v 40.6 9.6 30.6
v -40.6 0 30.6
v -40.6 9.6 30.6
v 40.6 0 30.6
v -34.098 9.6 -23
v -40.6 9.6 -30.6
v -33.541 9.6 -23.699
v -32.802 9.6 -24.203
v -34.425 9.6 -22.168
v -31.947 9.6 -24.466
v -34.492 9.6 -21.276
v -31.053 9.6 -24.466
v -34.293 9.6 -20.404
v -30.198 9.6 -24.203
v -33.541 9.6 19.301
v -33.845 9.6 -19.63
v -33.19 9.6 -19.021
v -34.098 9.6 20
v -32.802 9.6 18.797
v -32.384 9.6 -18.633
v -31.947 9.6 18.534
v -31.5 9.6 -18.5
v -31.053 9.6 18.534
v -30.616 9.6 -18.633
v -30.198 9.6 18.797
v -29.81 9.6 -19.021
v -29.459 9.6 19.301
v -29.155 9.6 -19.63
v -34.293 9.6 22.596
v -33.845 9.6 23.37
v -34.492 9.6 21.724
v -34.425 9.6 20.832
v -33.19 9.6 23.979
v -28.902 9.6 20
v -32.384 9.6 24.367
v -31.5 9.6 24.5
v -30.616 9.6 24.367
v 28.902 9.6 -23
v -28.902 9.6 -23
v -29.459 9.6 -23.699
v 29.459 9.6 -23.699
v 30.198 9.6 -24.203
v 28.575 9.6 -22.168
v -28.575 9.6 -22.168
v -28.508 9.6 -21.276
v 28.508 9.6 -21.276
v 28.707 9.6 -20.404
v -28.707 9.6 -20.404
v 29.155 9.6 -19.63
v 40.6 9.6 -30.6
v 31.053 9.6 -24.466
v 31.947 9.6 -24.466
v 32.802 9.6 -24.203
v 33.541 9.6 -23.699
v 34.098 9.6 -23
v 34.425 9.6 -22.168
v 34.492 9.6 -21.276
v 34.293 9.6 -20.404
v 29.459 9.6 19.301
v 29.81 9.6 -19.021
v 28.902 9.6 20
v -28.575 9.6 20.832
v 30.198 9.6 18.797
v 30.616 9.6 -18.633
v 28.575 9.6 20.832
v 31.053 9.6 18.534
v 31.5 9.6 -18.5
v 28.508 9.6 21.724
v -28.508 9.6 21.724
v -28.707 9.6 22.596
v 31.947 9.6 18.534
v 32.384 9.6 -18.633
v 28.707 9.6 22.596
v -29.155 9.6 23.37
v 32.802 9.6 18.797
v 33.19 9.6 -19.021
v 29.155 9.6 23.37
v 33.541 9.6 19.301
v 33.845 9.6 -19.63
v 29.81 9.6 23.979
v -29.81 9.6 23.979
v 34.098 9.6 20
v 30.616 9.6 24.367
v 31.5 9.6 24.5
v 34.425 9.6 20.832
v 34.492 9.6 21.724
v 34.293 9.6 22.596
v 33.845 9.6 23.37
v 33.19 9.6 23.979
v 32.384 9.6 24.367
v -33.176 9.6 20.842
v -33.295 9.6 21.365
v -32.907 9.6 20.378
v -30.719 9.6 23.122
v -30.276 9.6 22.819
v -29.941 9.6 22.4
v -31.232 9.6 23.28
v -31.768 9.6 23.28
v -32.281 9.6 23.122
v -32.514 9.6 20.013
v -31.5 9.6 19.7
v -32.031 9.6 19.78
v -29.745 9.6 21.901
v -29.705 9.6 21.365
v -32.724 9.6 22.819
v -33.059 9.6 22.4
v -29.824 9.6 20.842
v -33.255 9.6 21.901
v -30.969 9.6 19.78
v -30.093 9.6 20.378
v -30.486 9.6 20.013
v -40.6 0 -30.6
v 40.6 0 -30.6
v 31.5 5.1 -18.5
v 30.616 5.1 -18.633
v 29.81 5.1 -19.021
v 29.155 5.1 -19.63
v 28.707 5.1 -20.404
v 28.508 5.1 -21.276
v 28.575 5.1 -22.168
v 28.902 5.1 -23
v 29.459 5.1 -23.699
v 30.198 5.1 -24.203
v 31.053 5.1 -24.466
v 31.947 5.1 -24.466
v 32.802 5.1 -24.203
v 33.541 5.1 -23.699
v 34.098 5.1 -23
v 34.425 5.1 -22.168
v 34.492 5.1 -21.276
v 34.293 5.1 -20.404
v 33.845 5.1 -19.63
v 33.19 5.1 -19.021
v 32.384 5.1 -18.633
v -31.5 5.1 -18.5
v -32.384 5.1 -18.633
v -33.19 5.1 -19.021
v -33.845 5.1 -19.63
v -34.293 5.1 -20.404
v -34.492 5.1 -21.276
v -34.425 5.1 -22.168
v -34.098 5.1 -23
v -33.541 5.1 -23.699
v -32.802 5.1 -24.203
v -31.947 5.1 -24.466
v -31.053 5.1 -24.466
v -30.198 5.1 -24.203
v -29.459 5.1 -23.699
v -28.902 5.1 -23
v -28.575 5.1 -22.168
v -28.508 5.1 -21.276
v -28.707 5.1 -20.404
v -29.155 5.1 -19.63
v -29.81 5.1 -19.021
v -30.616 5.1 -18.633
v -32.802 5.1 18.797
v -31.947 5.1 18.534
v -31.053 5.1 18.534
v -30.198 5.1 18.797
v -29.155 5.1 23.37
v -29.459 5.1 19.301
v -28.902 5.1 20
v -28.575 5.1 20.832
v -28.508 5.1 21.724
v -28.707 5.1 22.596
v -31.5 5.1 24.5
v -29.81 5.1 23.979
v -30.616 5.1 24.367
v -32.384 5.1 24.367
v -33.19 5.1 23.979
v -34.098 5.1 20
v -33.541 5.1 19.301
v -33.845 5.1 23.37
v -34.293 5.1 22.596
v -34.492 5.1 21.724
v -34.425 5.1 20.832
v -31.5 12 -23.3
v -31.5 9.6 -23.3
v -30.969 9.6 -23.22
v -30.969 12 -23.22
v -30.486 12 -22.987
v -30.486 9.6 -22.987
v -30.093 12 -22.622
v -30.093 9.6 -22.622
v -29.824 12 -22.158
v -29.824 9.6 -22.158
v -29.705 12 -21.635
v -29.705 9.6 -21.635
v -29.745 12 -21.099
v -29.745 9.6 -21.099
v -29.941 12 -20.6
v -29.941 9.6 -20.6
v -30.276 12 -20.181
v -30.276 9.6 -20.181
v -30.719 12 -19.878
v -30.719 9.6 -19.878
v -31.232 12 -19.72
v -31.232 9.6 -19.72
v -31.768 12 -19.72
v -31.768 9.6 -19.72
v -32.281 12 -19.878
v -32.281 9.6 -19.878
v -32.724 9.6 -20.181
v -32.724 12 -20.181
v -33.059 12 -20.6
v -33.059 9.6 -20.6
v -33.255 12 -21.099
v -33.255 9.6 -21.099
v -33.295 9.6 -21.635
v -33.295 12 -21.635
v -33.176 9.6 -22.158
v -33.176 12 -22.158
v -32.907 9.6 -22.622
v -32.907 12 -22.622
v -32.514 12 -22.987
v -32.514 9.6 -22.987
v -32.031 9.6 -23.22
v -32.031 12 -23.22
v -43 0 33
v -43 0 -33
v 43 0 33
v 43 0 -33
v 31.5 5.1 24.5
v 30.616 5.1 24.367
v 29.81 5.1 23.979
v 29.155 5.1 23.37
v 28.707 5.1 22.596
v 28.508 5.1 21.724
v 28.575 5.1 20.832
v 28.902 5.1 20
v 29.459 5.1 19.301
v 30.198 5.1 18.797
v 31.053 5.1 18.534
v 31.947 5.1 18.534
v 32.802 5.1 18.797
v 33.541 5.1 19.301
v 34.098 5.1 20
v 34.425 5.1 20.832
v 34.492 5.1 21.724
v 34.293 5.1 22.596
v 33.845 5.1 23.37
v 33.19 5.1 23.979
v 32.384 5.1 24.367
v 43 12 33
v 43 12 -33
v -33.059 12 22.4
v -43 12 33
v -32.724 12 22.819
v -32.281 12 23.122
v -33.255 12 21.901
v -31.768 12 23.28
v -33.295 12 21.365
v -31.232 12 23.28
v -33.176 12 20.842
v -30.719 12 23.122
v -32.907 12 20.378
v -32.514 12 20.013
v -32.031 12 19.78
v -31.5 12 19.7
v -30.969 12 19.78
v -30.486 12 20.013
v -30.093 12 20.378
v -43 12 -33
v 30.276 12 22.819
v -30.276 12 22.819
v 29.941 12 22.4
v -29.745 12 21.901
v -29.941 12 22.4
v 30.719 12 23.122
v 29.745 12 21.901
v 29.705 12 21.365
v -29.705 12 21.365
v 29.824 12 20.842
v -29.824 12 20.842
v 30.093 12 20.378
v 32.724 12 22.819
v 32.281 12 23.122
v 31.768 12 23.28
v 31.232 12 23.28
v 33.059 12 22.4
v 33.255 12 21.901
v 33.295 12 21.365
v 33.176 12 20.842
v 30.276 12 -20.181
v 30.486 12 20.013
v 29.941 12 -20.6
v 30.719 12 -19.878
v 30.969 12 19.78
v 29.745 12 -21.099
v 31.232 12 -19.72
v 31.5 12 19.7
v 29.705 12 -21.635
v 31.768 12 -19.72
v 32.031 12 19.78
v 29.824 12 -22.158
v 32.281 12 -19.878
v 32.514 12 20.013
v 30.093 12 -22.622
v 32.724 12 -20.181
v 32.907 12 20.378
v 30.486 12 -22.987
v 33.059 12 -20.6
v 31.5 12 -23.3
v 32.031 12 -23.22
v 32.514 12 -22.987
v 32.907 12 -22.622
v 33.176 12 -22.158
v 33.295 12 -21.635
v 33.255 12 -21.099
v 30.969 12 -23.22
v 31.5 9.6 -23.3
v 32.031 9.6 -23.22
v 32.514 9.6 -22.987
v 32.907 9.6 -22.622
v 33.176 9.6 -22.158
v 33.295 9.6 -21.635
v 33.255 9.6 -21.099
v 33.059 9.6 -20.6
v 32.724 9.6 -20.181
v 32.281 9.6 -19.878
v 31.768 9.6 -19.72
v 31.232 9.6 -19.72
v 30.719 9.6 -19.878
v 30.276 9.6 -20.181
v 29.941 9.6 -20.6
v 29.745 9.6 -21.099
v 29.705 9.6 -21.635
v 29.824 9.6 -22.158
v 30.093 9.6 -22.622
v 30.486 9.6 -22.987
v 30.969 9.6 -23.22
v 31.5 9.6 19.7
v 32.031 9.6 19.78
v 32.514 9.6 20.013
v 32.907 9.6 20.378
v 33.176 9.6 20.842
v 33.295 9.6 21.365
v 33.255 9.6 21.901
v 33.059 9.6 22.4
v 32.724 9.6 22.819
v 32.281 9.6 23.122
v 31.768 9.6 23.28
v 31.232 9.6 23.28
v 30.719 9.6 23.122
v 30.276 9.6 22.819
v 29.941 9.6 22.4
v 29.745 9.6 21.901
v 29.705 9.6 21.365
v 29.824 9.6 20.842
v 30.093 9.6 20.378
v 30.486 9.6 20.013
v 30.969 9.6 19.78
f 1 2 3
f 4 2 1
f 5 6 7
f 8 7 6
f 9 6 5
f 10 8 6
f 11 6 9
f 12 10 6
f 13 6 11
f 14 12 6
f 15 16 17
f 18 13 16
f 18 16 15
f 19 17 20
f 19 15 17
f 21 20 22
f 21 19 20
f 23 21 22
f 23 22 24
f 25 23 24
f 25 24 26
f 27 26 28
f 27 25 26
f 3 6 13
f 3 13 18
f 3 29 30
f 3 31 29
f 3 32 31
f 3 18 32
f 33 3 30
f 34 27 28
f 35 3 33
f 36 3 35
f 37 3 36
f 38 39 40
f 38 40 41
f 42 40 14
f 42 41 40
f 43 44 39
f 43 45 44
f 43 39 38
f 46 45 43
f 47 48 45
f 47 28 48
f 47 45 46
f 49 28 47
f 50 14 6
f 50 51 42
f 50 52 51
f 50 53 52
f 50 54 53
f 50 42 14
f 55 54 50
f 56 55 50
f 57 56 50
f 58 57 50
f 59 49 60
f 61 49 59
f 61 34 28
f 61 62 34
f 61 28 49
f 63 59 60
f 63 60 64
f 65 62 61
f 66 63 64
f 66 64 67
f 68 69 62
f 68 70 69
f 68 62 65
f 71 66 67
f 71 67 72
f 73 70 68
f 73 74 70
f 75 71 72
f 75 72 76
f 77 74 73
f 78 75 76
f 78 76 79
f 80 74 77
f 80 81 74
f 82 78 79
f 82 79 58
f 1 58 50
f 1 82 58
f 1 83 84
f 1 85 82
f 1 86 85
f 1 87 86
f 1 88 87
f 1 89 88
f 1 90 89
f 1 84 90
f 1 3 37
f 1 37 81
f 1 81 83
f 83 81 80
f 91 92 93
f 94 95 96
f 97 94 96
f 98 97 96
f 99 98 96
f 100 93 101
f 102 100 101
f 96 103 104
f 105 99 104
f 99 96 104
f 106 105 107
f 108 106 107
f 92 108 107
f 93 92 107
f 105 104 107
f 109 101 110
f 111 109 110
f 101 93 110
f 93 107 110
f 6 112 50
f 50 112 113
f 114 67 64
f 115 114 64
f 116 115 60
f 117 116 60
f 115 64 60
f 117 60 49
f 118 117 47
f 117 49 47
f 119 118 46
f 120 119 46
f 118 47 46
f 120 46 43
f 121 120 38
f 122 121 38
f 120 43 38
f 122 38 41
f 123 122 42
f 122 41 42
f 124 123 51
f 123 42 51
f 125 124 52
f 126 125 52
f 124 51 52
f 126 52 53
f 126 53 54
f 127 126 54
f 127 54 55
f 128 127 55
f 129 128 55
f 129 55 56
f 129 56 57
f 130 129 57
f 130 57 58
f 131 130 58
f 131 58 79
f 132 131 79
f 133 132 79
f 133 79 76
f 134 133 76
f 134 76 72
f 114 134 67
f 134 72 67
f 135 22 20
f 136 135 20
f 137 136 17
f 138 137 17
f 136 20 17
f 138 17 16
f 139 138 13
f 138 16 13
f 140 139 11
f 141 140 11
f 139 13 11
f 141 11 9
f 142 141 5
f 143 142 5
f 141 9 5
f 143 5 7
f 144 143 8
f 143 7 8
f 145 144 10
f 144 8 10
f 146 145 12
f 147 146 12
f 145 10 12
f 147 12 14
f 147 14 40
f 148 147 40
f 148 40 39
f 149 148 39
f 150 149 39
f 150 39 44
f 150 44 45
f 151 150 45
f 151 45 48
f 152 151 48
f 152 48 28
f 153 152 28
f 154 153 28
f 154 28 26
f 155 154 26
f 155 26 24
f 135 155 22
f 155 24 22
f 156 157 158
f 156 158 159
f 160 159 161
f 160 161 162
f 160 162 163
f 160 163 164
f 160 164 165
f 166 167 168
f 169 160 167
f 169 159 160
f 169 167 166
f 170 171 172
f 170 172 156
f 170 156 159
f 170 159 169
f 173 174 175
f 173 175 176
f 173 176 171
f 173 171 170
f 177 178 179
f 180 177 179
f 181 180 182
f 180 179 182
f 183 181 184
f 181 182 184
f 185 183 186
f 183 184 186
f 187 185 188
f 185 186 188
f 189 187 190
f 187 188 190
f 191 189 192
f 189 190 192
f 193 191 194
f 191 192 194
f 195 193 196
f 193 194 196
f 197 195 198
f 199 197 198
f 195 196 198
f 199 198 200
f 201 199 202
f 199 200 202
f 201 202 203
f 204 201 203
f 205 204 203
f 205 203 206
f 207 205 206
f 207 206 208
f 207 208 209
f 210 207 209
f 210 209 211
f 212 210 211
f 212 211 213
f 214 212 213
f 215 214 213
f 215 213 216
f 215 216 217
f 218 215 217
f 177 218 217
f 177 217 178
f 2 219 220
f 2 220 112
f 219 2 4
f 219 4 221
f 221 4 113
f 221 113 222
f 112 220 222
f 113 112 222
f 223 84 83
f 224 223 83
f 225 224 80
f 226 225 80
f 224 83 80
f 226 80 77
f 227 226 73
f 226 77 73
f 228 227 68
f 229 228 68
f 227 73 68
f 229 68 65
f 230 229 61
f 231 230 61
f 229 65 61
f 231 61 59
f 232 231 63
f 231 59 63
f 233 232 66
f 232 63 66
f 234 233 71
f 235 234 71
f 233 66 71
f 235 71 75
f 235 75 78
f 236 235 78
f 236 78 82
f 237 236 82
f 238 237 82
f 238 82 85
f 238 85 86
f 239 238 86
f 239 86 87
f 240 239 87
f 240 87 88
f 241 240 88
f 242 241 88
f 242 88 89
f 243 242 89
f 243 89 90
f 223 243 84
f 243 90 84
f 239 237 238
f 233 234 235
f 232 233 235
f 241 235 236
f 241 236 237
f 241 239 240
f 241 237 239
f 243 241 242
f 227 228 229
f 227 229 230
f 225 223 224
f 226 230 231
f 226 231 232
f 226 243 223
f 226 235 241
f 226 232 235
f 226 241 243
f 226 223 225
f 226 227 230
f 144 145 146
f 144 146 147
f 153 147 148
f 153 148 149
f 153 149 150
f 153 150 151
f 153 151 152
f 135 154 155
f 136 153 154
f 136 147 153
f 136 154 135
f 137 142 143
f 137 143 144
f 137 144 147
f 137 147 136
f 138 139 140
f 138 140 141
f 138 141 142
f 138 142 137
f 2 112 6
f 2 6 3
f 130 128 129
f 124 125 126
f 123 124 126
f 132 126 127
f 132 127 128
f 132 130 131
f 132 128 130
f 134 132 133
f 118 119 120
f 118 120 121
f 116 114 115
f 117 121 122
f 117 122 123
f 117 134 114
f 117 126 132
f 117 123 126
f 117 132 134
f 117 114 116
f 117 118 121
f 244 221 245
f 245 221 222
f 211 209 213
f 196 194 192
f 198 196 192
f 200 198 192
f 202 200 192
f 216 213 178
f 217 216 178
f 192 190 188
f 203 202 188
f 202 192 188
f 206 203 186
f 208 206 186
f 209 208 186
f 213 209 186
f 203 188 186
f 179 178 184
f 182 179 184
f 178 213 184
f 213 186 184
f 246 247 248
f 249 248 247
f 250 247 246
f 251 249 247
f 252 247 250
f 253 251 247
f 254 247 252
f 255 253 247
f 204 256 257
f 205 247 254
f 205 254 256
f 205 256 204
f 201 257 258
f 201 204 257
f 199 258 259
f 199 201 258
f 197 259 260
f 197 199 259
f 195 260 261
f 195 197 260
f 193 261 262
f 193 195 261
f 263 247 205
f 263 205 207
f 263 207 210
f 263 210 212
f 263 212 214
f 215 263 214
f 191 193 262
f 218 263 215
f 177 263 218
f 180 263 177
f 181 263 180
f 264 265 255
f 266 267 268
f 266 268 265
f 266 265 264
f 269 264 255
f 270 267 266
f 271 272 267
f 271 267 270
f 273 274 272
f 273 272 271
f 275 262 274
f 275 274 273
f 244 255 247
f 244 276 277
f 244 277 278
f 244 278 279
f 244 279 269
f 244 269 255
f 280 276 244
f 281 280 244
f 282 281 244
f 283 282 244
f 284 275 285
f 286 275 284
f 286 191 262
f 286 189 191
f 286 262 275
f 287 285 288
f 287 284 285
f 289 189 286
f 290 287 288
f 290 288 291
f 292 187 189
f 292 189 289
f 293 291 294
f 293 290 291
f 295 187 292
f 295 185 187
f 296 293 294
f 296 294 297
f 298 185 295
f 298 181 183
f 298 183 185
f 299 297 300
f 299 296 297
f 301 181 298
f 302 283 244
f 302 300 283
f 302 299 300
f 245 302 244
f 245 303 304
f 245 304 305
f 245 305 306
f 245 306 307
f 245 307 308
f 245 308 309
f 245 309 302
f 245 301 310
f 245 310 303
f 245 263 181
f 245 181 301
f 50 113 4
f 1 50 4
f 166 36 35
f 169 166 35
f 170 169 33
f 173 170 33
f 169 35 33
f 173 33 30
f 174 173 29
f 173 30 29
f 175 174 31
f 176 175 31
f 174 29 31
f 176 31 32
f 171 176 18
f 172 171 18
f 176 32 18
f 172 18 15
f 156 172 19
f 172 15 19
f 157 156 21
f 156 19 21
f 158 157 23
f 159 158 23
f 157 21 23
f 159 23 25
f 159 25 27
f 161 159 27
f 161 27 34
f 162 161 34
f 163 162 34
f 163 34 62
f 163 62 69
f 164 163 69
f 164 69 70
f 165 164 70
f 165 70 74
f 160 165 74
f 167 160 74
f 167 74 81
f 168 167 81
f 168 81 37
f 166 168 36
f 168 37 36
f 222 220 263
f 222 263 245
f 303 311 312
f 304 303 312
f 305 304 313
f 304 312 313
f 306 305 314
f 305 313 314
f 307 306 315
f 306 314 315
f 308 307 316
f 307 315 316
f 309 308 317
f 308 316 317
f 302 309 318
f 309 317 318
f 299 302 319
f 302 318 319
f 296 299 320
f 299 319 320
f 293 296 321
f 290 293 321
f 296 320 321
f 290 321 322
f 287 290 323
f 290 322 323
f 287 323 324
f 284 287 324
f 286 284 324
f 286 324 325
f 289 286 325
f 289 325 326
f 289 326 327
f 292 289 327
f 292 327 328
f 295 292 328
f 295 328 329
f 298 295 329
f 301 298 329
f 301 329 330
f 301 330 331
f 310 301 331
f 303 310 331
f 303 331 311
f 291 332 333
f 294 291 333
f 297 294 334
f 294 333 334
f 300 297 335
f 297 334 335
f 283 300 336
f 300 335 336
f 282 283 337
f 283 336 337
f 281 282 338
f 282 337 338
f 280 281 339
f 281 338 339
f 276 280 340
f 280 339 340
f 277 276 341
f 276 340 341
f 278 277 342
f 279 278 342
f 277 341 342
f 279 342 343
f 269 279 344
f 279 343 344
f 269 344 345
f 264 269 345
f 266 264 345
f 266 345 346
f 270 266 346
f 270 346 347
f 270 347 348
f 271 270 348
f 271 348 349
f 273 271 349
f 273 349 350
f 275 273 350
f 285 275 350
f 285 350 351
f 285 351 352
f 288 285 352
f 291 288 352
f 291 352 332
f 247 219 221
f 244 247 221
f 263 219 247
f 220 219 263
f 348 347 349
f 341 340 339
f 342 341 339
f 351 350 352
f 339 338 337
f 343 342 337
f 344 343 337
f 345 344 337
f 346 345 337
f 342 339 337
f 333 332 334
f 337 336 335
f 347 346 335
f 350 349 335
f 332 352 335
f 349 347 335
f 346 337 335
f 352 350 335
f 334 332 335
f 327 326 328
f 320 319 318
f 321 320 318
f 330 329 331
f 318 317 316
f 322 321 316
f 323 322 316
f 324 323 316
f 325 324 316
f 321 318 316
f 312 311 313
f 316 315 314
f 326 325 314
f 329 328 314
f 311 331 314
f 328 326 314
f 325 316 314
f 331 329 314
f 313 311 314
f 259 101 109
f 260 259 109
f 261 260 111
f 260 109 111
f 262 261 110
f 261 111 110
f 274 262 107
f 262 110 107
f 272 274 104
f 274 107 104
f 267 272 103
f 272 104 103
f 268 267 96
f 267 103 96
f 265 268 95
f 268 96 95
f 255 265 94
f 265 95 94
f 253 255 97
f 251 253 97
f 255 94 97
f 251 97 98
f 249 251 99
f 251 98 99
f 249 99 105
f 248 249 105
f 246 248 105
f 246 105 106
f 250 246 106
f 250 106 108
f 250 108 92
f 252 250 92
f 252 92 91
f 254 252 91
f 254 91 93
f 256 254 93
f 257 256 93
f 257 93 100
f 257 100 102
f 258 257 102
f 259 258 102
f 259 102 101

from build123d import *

# Parameters (mm, degrees)
SKETCH1_W           = 86
SKETCH1_H           = 66
BOSS_EXTRUDE1_DEPTH = 12
SKETCH2_W           = 81.2
SKETCH2_H           = 61.2
CUT_EXTRUDE1_DEPTH  = 9.6
SKETCH3_R           = 3
BOSS_EXTRUDE2_DEPTH = 4.5
SKETCH4_R           = 1.8
CUT_EXTRUDE2_DEPTH  = 4.5


with BuildPart() as part:
    # Sketch1 → Boss-Extrude1 (new body)
    with BuildSketch(Plane(origin=(0, 0, 0), x_dir=(1, 0, 0), z_dir=(0, 1, 0))):
        Rectangle(SKETCH1_W, SKETCH1_H)
    extrude(amount=BOSS_EXTRUDE1_DEPTH)

    # Sketch2 → Cut-Extrude1 (cut)
    with BuildSketch(Plane.XZ):
        Rectangle(SKETCH2_W, SKETCH2_H)
    extrude(amount=-CUT_EXTRUDE1_DEPTH, mode=Mode.SUBTRACT)

    # Sketch3 → Boss-Extrude2 (add)
    with BuildSketch(Plane.XZ.offset(-9.6)):
        with Locations(Location((-31.5, -21.5, 0), (0, 0, 90))):
            Circle(SKETCH3_R)
        with Locations(Location((31.5, -21.5, 0), (0, 0, 90))):
            Circle(SKETCH3_R)
        with Locations(Location((-31.5, 21.5, 0), (0, 0, 90))):
            Circle(SKETCH3_R)
        with Locations(Location((31.5, 21.5, 0), (0, 0, 90))):
            Circle(SKETCH3_R)
    extrude(amount=BOSS_EXTRUDE2_DEPTH)

    # Sketch4 → Cut-Extrude2 (cut)
    with BuildSketch(Plane.XZ.offset(-9.6)):
        with Locations(Location((-31.5, -21.5, 0), (0, 0, 270))):
            Circle(SKETCH4_R)
        with Locations(Location((31.5, -21.5, 0), (0, 0, 270))):
            Circle(SKETCH4_R)
        with Locations(Location((-31.5, 21.5, 0), (0, 0, 270))):
            Circle(SKETCH4_R)
        with Locations(Location((31.5, 21.5, 0), (0, 0, 270))):
            Circle(SKETCH4_R)
    extrude(amount=-CUT_EXTRUDE2_DEPTH, mode=Mode.SUBTRACT)


solid = part.part
